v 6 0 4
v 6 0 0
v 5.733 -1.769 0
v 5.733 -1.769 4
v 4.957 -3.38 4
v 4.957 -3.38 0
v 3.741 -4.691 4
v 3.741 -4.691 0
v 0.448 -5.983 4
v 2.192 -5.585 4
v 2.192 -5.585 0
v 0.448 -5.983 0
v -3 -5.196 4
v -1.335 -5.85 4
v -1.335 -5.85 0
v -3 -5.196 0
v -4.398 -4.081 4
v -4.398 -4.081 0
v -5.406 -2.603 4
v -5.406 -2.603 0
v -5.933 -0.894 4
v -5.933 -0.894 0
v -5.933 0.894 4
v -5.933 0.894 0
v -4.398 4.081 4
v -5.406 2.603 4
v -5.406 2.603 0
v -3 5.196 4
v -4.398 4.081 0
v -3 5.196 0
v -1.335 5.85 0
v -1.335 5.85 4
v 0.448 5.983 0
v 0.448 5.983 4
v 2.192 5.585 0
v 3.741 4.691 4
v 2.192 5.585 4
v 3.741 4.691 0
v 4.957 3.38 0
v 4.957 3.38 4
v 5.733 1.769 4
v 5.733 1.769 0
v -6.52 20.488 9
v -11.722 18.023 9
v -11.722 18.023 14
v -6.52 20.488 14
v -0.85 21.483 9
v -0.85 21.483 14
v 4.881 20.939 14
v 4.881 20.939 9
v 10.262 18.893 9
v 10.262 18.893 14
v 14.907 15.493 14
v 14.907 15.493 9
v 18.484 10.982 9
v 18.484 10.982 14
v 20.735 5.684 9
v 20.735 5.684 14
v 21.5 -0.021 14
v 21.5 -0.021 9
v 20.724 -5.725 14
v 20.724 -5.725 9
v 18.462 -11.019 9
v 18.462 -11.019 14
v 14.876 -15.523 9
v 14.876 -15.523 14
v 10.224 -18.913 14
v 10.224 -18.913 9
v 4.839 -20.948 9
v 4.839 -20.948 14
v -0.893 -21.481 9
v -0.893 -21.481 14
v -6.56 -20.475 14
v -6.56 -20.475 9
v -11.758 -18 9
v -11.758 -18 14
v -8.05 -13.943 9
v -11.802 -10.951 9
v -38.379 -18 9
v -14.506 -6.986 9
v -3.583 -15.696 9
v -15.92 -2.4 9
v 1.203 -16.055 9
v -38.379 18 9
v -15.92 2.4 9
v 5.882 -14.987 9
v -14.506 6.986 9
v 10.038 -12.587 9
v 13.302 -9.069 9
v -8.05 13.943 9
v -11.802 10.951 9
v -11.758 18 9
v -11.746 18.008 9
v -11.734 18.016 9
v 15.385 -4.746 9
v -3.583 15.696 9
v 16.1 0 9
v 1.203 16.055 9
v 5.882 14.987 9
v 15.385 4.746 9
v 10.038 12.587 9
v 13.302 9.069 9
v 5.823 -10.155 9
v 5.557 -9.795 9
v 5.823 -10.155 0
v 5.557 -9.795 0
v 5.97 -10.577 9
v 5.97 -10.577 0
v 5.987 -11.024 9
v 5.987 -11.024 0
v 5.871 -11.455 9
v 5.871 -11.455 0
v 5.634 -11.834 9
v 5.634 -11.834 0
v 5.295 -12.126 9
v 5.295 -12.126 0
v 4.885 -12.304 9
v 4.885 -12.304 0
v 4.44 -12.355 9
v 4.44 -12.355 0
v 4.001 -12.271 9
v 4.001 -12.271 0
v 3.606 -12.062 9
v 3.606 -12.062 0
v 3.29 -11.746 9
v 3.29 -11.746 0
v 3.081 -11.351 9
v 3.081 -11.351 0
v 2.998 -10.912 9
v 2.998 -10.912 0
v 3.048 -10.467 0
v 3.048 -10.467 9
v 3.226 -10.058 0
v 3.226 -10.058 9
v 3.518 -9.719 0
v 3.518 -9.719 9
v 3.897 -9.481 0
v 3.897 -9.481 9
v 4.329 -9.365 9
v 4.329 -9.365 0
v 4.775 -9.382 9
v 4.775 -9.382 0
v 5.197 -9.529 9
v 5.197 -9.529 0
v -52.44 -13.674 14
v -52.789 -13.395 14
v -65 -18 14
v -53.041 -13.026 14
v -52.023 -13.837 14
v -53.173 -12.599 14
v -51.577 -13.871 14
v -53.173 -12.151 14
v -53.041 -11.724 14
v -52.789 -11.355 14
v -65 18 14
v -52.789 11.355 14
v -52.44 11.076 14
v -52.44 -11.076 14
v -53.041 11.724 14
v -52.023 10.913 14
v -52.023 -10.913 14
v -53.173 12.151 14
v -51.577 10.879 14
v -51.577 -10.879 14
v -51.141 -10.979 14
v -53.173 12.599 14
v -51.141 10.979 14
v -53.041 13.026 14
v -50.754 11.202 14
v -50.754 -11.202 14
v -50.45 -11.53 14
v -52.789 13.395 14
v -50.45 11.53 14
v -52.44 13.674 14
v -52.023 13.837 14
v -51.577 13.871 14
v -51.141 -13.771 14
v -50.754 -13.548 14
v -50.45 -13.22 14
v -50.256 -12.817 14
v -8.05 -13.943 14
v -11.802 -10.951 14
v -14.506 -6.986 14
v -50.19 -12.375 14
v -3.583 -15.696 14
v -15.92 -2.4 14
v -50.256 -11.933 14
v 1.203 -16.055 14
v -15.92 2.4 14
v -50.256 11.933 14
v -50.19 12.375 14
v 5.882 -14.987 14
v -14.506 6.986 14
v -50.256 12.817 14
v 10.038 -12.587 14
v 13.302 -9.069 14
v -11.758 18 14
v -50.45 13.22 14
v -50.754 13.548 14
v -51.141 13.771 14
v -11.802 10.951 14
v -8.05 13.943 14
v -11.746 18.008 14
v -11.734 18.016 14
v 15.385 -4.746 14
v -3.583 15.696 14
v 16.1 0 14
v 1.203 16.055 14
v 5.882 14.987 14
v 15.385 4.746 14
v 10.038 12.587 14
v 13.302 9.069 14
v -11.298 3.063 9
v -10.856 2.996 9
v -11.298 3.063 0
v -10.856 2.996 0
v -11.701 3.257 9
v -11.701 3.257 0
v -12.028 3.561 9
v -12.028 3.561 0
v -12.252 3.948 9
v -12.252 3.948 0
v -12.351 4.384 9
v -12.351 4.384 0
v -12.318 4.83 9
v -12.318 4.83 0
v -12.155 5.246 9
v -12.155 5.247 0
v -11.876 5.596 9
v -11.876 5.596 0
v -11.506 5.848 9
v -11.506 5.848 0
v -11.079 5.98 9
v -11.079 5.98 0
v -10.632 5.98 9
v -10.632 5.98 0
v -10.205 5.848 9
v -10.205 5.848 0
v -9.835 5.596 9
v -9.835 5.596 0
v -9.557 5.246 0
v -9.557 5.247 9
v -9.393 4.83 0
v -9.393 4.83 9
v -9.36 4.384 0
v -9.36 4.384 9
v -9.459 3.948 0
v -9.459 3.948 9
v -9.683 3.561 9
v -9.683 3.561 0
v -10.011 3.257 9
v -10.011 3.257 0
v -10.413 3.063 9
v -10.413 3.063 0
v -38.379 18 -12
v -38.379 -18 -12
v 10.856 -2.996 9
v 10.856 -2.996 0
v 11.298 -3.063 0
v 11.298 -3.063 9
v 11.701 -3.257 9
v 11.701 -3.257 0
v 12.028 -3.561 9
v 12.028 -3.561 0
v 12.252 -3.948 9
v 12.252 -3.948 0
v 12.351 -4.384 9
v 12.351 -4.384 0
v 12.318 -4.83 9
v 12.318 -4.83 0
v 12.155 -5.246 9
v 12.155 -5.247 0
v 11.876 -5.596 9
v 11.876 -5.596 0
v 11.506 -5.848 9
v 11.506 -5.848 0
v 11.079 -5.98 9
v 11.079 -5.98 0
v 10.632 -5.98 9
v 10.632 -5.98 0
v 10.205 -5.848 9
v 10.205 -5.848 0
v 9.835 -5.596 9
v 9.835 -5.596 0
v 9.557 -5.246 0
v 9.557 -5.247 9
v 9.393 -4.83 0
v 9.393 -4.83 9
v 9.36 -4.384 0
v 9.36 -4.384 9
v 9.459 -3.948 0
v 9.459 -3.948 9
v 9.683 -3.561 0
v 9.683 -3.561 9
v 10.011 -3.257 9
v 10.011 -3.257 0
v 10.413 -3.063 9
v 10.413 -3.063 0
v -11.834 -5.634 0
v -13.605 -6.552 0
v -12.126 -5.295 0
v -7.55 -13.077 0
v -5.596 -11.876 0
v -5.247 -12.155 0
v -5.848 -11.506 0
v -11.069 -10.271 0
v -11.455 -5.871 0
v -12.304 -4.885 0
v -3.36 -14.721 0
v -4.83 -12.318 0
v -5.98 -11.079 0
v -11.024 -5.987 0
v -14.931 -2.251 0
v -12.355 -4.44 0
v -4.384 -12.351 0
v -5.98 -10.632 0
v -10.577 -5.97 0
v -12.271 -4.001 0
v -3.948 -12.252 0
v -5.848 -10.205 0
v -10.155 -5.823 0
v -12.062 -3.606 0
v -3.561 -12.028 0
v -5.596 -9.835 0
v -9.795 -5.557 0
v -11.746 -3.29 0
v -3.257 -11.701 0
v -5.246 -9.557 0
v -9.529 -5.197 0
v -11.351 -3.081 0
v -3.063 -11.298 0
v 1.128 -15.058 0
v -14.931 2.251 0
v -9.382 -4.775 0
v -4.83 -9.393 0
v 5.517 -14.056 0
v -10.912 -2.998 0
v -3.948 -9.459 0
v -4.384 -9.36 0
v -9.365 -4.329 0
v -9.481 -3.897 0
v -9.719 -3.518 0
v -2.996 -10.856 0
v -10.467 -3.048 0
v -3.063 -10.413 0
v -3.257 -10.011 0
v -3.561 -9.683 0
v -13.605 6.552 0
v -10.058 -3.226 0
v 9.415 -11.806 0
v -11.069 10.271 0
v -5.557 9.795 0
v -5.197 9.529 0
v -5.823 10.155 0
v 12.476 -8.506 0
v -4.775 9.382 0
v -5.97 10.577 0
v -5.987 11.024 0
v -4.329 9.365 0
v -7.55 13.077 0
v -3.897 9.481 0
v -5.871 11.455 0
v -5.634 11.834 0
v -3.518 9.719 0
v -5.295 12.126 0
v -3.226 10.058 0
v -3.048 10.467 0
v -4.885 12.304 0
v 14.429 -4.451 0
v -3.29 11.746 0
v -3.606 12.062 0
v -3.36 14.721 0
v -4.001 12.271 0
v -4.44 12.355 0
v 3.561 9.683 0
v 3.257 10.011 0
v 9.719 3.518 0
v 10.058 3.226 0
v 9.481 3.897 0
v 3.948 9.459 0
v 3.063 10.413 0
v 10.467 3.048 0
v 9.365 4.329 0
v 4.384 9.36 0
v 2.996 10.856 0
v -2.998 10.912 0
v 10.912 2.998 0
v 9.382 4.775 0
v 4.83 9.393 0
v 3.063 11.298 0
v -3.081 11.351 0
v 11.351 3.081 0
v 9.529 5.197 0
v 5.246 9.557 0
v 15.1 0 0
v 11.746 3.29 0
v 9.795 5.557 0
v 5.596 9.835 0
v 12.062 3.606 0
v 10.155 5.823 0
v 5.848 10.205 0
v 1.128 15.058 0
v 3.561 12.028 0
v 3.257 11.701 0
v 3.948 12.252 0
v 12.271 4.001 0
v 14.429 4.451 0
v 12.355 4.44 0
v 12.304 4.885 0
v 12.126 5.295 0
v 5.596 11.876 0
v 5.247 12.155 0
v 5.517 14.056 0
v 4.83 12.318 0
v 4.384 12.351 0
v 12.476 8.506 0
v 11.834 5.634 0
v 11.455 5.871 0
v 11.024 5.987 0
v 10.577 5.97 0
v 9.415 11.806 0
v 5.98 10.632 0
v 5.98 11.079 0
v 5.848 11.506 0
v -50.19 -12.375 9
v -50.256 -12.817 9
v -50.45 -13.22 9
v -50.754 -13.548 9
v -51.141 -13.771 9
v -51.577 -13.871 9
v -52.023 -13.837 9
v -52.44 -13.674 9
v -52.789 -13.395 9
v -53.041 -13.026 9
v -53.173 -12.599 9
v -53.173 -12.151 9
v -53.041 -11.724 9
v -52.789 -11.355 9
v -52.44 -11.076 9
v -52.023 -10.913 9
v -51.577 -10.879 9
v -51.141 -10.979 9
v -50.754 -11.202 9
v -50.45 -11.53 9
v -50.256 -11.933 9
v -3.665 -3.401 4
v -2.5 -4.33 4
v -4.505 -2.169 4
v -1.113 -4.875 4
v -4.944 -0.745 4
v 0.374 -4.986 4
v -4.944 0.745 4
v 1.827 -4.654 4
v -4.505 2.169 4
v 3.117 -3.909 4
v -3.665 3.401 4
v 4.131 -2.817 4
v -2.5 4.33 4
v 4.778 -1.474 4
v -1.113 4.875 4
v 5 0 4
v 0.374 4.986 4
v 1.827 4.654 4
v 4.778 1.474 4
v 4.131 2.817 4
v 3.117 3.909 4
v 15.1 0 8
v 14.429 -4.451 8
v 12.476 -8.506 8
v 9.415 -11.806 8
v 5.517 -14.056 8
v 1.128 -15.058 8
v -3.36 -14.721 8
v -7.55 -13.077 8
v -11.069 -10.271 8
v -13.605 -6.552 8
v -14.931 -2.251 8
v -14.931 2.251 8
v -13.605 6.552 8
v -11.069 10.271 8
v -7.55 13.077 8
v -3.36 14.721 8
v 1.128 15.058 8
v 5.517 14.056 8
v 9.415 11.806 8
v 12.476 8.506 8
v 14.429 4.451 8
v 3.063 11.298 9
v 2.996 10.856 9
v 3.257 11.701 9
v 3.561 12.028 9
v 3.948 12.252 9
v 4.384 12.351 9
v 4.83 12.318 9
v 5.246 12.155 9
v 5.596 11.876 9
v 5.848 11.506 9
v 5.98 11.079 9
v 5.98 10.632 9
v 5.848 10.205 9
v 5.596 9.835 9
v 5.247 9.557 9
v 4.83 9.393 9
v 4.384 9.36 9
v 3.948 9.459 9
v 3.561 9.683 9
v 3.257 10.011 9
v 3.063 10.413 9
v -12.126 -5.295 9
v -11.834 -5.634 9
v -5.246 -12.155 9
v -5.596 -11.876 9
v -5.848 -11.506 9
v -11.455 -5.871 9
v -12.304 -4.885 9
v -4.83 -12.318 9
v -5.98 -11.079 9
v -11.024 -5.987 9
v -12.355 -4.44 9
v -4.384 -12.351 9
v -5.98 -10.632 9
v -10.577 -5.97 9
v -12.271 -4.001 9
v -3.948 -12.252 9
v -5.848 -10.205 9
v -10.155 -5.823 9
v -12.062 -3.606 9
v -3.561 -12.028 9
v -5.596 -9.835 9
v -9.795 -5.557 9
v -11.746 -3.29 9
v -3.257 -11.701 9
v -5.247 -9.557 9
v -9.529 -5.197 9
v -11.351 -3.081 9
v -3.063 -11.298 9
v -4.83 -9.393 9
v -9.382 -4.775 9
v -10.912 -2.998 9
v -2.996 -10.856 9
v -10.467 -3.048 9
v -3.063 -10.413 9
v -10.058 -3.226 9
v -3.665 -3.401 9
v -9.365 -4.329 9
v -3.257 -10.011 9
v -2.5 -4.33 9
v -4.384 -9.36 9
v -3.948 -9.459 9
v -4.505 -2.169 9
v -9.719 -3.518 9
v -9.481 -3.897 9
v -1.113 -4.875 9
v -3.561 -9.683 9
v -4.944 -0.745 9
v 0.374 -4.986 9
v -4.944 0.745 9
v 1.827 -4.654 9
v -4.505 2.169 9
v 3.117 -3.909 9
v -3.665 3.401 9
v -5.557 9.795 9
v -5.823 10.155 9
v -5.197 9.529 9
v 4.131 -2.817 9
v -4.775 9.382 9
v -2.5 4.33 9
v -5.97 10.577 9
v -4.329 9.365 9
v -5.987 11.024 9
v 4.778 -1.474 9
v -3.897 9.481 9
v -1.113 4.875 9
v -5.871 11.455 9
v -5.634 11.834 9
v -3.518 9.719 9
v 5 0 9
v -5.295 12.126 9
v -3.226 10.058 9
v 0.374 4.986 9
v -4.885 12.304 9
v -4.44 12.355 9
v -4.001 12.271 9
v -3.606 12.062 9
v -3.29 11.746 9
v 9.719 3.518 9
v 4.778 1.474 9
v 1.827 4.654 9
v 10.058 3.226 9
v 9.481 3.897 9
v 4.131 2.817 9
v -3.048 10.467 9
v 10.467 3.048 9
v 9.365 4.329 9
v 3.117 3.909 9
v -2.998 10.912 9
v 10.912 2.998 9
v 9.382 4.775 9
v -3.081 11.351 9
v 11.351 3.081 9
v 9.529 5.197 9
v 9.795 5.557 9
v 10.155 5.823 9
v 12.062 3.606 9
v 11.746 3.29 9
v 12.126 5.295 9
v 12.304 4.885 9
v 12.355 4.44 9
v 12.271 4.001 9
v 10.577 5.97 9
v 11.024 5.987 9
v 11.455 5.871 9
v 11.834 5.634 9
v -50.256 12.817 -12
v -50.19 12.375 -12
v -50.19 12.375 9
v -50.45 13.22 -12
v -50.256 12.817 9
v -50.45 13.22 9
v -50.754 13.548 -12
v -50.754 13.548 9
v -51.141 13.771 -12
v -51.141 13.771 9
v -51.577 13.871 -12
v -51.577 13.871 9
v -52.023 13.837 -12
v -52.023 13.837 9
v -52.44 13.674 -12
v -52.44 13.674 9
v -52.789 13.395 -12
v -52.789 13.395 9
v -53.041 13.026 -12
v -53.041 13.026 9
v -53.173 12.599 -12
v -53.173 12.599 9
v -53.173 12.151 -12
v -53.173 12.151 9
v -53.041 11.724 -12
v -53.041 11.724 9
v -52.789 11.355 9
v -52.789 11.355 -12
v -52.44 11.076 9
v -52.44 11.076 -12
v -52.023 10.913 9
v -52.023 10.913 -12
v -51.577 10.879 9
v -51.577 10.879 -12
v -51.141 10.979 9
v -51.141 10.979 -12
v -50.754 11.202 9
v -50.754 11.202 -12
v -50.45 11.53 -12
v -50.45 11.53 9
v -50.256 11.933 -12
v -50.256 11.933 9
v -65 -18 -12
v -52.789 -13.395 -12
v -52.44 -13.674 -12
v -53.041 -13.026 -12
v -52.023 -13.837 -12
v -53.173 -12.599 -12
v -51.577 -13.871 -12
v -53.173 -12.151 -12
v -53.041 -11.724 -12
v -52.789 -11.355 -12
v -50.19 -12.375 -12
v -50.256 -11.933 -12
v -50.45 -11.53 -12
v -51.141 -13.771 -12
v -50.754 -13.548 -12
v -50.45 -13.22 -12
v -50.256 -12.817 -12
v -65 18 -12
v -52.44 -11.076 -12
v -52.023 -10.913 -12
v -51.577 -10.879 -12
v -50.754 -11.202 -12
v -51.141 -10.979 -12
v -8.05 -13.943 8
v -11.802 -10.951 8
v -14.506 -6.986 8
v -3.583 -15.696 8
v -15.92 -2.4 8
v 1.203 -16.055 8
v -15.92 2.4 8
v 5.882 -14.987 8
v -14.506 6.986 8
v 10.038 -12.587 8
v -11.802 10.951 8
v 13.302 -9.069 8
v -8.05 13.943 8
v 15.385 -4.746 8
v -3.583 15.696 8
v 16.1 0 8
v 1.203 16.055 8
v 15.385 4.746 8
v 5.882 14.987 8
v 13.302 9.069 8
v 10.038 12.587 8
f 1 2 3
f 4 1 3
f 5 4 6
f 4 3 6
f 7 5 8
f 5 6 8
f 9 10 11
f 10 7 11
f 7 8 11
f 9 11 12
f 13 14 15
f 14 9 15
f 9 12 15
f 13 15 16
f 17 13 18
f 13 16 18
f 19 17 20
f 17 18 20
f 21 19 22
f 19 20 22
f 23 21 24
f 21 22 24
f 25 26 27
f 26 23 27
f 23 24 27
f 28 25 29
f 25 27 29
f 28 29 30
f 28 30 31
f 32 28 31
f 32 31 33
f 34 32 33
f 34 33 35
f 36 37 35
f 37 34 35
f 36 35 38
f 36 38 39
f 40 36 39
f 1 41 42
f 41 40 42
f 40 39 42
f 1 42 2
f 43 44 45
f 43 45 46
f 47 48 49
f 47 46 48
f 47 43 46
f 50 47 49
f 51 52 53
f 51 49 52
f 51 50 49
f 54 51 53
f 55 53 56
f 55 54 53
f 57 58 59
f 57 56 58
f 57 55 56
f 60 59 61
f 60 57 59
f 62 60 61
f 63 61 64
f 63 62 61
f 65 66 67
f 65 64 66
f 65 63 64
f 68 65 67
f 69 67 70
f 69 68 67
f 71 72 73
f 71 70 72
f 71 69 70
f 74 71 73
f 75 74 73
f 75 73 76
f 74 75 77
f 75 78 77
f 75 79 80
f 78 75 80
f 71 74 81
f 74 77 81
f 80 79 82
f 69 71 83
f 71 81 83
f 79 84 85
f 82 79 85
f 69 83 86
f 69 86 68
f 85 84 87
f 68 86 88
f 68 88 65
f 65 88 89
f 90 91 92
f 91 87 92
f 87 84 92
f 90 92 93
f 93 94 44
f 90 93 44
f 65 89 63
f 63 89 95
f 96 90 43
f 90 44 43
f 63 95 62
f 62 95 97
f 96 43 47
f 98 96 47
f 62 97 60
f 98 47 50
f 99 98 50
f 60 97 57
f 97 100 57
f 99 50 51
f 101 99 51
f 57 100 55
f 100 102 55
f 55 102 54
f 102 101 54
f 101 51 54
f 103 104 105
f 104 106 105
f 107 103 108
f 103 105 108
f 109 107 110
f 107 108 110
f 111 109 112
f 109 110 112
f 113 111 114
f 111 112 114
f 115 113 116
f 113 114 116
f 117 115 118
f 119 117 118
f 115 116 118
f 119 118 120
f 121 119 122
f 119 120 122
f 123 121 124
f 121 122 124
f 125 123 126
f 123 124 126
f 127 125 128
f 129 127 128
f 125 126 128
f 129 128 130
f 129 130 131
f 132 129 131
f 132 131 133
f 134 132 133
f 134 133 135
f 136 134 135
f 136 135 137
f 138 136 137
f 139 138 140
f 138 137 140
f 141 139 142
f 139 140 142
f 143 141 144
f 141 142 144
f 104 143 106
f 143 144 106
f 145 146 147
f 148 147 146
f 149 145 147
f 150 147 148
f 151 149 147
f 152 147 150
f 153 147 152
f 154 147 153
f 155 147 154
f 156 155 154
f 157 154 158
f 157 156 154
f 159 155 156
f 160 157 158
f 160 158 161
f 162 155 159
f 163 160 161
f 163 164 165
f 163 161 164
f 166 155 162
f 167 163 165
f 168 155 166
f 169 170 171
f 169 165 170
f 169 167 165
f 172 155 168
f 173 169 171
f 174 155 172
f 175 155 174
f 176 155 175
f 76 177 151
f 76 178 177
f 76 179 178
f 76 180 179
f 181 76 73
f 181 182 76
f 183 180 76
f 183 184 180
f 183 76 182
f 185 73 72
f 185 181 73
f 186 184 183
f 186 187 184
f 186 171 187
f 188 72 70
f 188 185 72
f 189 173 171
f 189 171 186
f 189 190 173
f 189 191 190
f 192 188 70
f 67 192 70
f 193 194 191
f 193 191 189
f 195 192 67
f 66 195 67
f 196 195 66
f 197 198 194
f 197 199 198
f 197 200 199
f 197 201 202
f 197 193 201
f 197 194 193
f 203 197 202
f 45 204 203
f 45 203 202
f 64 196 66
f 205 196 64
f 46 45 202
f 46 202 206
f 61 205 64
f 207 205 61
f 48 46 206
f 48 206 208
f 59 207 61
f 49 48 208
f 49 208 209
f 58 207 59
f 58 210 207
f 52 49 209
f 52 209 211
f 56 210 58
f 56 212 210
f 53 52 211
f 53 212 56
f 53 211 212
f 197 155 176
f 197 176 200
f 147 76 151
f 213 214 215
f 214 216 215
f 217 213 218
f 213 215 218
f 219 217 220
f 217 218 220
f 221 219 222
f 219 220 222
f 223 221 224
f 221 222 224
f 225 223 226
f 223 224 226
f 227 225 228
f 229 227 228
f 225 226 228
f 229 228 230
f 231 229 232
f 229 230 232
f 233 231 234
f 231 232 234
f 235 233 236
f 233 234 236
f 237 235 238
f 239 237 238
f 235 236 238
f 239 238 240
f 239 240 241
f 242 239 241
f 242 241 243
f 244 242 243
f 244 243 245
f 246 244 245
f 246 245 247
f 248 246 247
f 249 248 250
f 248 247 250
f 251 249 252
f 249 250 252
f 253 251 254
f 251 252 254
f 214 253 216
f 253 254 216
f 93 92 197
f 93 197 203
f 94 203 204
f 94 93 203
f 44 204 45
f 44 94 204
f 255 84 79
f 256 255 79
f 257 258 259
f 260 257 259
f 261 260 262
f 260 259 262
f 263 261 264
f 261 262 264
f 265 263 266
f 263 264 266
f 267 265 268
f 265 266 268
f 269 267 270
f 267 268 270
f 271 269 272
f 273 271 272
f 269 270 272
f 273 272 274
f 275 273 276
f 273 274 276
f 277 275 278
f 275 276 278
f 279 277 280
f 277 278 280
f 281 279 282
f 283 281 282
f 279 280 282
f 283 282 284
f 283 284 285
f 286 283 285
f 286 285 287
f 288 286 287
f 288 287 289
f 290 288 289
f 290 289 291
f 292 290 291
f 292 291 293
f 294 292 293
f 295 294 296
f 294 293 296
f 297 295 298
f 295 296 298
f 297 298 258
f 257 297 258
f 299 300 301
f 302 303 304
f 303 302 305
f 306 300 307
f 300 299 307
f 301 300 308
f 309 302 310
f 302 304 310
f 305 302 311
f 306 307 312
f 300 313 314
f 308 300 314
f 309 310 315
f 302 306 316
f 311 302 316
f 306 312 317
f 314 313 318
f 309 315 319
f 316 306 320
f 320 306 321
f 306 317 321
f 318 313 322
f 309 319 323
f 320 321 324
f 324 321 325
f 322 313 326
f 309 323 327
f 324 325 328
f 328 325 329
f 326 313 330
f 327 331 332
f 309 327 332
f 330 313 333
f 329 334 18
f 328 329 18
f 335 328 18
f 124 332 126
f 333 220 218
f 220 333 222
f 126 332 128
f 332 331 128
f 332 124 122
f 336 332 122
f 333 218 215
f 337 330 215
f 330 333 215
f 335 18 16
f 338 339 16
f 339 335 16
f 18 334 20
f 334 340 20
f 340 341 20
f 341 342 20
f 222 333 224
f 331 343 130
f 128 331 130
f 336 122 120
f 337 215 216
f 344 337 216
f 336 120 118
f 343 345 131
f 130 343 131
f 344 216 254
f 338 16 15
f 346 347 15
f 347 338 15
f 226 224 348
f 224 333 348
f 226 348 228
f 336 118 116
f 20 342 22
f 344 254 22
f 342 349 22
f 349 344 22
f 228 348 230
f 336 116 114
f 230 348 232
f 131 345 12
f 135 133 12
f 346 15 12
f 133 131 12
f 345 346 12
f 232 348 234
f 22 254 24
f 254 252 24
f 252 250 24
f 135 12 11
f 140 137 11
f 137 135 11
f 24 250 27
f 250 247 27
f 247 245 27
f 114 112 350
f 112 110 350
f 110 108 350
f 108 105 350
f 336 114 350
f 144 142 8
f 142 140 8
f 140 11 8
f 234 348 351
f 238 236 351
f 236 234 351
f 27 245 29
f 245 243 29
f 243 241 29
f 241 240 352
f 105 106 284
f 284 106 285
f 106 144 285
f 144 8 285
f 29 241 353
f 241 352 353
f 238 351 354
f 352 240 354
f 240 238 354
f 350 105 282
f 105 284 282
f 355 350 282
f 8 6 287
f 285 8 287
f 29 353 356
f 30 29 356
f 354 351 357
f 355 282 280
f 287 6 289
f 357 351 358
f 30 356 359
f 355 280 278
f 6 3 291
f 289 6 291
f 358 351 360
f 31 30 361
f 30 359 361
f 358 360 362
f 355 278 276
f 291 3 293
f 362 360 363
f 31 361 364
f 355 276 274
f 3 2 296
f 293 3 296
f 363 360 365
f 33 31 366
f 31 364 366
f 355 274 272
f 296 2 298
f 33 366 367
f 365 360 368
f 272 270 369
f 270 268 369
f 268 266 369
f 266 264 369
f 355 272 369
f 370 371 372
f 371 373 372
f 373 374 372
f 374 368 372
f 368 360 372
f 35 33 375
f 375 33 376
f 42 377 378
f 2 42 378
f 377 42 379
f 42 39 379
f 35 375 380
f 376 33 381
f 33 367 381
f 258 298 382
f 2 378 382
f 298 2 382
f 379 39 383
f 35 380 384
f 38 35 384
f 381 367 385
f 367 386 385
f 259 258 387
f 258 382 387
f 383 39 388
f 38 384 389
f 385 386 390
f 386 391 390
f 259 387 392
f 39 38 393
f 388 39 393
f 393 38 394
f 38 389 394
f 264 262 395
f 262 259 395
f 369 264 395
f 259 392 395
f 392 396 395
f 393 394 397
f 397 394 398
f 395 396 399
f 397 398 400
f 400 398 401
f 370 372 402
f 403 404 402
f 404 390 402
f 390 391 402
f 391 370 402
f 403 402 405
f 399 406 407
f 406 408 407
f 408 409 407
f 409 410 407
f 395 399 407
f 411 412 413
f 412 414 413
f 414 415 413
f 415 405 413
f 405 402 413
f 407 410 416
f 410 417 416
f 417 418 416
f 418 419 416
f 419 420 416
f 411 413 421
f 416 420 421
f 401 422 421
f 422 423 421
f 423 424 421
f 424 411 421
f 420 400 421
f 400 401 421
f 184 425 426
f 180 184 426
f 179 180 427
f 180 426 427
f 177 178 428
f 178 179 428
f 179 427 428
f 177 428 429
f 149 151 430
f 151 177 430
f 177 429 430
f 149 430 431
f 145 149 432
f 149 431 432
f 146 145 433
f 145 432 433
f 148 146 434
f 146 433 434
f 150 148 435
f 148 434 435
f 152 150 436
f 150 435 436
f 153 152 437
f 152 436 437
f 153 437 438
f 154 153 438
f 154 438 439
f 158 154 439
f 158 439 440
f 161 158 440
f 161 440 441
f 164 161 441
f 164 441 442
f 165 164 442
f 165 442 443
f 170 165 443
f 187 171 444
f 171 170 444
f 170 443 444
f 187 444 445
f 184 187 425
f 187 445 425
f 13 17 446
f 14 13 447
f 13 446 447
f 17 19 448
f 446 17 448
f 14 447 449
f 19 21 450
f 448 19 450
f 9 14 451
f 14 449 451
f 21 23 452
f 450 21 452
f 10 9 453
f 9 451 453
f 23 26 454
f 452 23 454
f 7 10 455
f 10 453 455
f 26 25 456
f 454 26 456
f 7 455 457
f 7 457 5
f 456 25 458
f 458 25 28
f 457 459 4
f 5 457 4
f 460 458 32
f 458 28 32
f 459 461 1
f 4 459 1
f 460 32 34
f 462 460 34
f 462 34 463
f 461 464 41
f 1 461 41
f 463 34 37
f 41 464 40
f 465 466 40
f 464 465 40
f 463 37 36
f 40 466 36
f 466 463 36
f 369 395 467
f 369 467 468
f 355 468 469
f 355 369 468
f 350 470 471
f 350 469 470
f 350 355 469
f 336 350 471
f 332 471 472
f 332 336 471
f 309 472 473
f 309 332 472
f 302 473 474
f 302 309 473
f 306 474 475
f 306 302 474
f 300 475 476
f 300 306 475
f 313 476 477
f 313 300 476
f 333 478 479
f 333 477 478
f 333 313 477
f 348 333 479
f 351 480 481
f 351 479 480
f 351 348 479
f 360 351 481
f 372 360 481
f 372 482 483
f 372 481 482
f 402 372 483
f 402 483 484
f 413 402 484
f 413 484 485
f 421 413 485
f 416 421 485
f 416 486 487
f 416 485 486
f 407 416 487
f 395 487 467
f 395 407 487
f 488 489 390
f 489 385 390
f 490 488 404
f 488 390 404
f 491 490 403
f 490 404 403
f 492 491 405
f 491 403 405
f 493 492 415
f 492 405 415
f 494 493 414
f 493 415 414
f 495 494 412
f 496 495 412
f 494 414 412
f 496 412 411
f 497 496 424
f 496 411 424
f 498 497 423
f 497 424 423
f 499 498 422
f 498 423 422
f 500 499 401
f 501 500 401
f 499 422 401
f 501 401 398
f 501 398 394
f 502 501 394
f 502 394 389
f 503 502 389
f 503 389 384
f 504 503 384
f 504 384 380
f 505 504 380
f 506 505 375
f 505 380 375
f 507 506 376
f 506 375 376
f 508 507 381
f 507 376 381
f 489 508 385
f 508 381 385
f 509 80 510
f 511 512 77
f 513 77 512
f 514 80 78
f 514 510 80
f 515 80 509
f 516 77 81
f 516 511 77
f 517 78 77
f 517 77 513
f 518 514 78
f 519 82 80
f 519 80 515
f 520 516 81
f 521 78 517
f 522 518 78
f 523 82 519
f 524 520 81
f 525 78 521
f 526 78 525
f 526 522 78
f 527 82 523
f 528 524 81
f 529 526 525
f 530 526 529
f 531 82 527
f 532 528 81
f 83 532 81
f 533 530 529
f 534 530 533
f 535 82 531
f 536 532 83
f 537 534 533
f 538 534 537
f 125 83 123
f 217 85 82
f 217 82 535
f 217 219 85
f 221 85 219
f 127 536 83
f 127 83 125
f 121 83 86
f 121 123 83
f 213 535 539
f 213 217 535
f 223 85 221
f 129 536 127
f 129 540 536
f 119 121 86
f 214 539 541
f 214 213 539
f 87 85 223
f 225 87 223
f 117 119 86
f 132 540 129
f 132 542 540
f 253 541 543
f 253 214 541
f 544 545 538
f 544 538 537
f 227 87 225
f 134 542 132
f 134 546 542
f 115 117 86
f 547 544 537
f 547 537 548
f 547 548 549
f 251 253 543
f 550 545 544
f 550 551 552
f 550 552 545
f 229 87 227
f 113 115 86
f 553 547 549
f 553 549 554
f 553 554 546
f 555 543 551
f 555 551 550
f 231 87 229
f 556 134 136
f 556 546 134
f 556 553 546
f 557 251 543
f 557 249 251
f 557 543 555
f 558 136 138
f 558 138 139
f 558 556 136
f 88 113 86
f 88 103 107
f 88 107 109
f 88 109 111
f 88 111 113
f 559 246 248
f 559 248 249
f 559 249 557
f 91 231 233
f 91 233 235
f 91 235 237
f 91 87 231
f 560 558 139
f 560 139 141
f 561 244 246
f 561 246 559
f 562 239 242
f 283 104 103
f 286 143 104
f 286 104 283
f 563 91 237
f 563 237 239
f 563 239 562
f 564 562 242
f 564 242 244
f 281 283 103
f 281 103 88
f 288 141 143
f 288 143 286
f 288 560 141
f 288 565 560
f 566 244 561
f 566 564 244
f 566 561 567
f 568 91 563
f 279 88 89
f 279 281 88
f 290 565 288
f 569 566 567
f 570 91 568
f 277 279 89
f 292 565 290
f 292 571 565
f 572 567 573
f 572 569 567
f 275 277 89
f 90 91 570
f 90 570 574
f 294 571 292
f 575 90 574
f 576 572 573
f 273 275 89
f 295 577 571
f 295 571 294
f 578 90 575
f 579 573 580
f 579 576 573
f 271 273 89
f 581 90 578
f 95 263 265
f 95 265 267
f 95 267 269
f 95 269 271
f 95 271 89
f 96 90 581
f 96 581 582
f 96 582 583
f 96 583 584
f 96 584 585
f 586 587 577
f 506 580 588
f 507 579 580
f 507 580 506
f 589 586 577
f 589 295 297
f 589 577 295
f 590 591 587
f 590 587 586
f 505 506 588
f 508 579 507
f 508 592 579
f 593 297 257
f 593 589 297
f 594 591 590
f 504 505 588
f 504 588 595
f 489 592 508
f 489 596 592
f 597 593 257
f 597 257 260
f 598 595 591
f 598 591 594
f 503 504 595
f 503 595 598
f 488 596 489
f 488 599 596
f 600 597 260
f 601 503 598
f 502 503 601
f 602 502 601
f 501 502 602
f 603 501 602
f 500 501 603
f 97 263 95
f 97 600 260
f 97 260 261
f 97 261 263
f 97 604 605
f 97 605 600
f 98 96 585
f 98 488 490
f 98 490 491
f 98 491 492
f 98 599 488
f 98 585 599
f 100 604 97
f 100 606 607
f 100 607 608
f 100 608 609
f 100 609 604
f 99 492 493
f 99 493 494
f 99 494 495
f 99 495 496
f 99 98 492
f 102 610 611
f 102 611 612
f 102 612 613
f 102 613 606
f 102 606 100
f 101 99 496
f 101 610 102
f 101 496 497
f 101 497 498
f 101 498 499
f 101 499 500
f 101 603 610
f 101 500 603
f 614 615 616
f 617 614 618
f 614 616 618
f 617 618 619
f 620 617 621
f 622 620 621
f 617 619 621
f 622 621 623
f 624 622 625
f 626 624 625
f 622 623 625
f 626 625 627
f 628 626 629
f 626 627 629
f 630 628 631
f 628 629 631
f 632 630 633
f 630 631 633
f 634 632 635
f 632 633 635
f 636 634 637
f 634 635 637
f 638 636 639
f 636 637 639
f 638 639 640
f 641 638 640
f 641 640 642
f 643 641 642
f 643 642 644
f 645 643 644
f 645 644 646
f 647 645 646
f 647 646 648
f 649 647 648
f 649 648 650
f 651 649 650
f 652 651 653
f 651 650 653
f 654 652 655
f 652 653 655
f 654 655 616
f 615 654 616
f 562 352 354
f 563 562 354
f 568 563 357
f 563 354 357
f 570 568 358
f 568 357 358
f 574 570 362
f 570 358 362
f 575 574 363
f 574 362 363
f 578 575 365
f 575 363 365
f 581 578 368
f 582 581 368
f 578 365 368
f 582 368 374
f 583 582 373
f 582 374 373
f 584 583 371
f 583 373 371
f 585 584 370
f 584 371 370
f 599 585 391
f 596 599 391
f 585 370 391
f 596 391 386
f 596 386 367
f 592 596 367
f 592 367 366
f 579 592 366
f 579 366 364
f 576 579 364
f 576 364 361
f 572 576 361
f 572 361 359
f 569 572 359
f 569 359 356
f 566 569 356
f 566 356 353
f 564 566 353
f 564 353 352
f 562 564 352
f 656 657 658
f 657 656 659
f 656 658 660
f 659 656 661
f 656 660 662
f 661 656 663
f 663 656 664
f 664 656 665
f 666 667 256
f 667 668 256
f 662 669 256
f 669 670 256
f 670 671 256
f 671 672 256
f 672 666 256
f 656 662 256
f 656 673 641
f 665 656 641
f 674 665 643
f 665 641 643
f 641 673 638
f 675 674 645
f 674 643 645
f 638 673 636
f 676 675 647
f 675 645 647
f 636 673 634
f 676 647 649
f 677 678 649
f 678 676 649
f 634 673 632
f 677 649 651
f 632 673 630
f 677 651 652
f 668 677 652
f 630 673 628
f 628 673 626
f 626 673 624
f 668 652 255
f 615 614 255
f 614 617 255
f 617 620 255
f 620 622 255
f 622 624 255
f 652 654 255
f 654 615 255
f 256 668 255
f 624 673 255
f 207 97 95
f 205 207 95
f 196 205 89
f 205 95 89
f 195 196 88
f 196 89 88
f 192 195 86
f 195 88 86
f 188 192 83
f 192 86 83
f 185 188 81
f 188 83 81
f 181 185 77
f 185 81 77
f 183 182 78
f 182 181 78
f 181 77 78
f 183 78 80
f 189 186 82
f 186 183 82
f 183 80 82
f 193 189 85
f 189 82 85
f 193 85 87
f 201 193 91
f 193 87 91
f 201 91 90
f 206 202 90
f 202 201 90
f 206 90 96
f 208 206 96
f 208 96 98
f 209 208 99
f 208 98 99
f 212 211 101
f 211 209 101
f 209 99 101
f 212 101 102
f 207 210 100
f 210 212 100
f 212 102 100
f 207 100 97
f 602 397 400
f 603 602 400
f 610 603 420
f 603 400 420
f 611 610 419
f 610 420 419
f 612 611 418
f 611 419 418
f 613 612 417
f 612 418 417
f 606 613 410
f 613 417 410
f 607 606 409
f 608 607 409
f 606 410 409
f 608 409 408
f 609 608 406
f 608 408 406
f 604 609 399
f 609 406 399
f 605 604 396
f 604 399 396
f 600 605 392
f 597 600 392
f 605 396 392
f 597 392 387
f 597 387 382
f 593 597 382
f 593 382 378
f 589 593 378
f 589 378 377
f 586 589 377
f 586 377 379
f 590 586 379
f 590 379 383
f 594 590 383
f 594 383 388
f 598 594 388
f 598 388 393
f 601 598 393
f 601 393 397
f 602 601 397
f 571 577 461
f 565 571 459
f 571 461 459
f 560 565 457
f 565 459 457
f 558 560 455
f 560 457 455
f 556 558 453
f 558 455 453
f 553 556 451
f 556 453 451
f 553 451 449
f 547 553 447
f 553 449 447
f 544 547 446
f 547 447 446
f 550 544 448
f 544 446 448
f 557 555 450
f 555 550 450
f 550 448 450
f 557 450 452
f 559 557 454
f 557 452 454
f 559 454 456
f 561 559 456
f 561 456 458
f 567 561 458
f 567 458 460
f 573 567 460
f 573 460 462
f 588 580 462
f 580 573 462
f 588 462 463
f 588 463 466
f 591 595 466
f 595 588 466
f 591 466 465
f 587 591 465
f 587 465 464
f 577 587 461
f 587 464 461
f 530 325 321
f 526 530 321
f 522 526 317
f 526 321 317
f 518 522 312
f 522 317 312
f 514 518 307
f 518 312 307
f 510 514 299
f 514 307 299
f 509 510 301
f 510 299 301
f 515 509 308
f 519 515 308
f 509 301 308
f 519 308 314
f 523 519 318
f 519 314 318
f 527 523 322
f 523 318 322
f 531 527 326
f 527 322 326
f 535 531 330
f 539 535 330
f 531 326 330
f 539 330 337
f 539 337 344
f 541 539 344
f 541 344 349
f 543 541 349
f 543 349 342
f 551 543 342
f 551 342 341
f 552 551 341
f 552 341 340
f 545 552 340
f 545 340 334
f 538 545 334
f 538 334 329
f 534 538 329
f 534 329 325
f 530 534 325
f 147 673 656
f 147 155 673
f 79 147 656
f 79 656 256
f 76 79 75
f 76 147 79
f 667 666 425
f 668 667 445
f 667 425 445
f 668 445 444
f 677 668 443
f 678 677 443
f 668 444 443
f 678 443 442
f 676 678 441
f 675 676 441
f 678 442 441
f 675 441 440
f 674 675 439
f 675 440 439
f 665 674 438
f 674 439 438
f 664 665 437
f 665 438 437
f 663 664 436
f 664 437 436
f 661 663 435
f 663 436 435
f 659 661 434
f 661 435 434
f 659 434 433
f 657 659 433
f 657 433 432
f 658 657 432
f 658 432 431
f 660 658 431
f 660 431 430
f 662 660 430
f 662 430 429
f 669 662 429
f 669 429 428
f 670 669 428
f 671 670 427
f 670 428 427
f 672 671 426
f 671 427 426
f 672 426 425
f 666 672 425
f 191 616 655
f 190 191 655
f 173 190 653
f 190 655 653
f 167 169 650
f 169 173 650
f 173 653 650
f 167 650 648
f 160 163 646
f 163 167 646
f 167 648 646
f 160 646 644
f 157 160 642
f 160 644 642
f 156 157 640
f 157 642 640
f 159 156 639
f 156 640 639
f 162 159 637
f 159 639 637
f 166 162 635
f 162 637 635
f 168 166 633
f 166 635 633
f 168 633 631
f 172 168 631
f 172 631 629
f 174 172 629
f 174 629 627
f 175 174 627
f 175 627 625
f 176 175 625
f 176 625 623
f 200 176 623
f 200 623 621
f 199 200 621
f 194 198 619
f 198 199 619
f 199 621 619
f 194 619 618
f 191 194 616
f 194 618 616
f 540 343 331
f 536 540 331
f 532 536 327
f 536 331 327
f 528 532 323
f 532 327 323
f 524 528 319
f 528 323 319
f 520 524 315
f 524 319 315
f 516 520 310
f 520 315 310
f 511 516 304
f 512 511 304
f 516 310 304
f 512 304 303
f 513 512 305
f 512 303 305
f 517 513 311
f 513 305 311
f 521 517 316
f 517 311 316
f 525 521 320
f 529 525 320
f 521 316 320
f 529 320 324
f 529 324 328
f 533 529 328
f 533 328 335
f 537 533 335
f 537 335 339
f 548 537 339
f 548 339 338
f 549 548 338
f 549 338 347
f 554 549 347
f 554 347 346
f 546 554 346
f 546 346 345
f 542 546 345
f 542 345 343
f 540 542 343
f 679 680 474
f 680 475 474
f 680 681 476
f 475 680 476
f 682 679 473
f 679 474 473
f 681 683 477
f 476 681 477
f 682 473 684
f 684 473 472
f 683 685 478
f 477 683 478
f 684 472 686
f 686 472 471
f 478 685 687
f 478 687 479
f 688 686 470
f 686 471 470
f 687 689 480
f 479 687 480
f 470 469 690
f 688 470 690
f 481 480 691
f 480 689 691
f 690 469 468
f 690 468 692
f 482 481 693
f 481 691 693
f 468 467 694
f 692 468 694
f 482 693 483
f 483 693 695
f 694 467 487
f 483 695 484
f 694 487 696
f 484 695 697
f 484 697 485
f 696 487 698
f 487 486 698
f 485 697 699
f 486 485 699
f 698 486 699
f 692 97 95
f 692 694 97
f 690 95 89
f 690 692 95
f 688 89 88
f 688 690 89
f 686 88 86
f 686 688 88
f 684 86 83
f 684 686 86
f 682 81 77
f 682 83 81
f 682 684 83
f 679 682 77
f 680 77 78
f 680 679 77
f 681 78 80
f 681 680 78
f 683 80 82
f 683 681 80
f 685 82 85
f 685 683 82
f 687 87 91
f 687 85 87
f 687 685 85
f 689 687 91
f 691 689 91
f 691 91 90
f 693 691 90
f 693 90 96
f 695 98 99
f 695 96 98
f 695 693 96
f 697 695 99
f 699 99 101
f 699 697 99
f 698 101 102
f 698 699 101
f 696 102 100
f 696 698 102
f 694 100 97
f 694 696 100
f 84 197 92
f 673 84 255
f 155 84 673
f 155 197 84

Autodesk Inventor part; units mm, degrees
ref_plane "YZ Plane" through (0, 0, 0) normal (1, 0, 0) x (0, 1, 0)
ref_plane "XZ Plane" through (0, 0, 0) normal (0, 1, 0) x (-1, 0, 0)
ref_plane "XY Plane" through (0, 0, 0) normal (0, 0, 1) x (1, 0, 0)
sketch "Sketch1" plane through (0, 0, 0) normal (0, 0, 1) x (1, 0, 0)
  circle A0 centre (0, 0) radius 15.1
  circle A1 centre (0, 0) radius 5
  dimension "d0" = 30.2
  dimension "d1" = 10
extrude "Extrusion1" add sketch "Sketch1" along normal blind 8
sketch "Sketch3" plane through (0, 0, 8) normal (0, 0, 1) x (1, 0, 0)
  circle A0 centre (0, 0) radius 5 projected
  circle A1 centre (0, 0) radius 15.1 projected
  circle A2 centre (0, 0) radius 16.1
  dimension "d21" = 1
extrude "Extrusion3" add sketch "Sketch3" along normal blind 1 contours A1 | A2
sketch "Sketch4" plane through (0, 0, 9) normal (0, 0, 1) x (1, 0, 0)
  circle A0 centre (0, 0) radius 5 projected
  circle A1 centre (0, 0) radius 16.1 projected
  line L0 (0, 0) -> (-41.1674, 0) construction
  line L1 (-65, -18) -> (-11.758, -18)
  line L2 (-11.758, 18) -> (-65, 18)
  line L3 (-65, 18) -> (-65, -18)
  line L4 (-11.758, 18) -> (-11.758, -18) construction
  line L5 (0, 0) -> (-51.0801, 0) construction
  line L6 (-38.379, 18) -> (-38.379, -18)
  circle A2 centre (-51.6895, 12.375) radius 1.5
  circle A3 centre (-51.6895, -12.375) radius 1.5
  circle A4 centre (0, 0) radius 6
  circle A5 centre (0, 0) radius 9
  line L7 (-51.6895, 12.375) -> (-51.6895, -12.375) construction
  arc A6 (-11.7222, 18.0234) -> (-11.758, 18) centre (0, 0) ccw
  arc A7 (-11.758, -18) -> (-11.758, 18) centre (0, 0) ccw
  point P0 (-38.379, 0.051)
  point P1 (-51.6895, 0)
  point P2 (-11.758, -18)
  point P3 (-11.7222, 18.0234)
  dimension "d29" = 0
  dimension "d30" = 36
  dimension "d31" = 65
  dimension "d494" = 0
  dimension "d629" = 3
  dimension "d630" = 24.75
  dimension "d633" = 12
  dimension "d634" = 3
  dimension "d646" = 21.5
extrude "Extrusion5" add sketch "Sketch4" along normal blind 5 contours L3 L2 L6 L1 | L6 L2 A6 A7 L1
extrude "Extrusion86" add sketch "Sketch4" against normal blind 21 contours L3 L2 L6 L1
extrude "Extrusion87" cut sketch "Sketch4" along normal blind 4 from surface at -9 contours A0 | A4
sketch "Skizze97" plane through (0, 0, 0) normal (0, 0, 1) x (1, 0, 0)
  circle A0 centre (0, 0) radius 5
  circle A1 centre (0, 0) radius 22.6
  line L0 (0, 0) -> (0, -22.6) construction
  circle A2 centre (0, 0) radius 22.6
  line L1 (0, 0) -> (-8.6486, -20.8797) construction
  circle A3 centre (-4.4965, -10.8556) radius 1.5
  dimension "d637" = 22.5
  dimension "d638" = 3
  dimension "d639" = 11.75
extrude "Extrusion88" cut sketch "Skizze97" along normal through all contours A3
pattern_circular "Runde Anordnung5" count 8 over 360 about axis through (0, 0, -10) along (0, 0, 1) of "Extrusion88"
equation "\"E_\" = 1"
equation "\"Rr_\" = 2"
equation "\"R_\" = 19"
equation "\"Ri\" = 11.75"
equation "\"Ra\" = 21.5"
equation "\"Rl\" = 17.5"
equation "\"Rla\" = 18.5"
equation "\"Rli\" = 15"
equation "\"Rsi\" = 5"
equation "\"Rsa\" = 7.5"
equation "\"Rca\" = 7"
equation "\"Ras\" = 1"
equation "\"Rci\" = 5"
equation "\"Rea\" = 3.5"
equation "\"Rei\" = 2"
properties part number "motor_6809_ab"
